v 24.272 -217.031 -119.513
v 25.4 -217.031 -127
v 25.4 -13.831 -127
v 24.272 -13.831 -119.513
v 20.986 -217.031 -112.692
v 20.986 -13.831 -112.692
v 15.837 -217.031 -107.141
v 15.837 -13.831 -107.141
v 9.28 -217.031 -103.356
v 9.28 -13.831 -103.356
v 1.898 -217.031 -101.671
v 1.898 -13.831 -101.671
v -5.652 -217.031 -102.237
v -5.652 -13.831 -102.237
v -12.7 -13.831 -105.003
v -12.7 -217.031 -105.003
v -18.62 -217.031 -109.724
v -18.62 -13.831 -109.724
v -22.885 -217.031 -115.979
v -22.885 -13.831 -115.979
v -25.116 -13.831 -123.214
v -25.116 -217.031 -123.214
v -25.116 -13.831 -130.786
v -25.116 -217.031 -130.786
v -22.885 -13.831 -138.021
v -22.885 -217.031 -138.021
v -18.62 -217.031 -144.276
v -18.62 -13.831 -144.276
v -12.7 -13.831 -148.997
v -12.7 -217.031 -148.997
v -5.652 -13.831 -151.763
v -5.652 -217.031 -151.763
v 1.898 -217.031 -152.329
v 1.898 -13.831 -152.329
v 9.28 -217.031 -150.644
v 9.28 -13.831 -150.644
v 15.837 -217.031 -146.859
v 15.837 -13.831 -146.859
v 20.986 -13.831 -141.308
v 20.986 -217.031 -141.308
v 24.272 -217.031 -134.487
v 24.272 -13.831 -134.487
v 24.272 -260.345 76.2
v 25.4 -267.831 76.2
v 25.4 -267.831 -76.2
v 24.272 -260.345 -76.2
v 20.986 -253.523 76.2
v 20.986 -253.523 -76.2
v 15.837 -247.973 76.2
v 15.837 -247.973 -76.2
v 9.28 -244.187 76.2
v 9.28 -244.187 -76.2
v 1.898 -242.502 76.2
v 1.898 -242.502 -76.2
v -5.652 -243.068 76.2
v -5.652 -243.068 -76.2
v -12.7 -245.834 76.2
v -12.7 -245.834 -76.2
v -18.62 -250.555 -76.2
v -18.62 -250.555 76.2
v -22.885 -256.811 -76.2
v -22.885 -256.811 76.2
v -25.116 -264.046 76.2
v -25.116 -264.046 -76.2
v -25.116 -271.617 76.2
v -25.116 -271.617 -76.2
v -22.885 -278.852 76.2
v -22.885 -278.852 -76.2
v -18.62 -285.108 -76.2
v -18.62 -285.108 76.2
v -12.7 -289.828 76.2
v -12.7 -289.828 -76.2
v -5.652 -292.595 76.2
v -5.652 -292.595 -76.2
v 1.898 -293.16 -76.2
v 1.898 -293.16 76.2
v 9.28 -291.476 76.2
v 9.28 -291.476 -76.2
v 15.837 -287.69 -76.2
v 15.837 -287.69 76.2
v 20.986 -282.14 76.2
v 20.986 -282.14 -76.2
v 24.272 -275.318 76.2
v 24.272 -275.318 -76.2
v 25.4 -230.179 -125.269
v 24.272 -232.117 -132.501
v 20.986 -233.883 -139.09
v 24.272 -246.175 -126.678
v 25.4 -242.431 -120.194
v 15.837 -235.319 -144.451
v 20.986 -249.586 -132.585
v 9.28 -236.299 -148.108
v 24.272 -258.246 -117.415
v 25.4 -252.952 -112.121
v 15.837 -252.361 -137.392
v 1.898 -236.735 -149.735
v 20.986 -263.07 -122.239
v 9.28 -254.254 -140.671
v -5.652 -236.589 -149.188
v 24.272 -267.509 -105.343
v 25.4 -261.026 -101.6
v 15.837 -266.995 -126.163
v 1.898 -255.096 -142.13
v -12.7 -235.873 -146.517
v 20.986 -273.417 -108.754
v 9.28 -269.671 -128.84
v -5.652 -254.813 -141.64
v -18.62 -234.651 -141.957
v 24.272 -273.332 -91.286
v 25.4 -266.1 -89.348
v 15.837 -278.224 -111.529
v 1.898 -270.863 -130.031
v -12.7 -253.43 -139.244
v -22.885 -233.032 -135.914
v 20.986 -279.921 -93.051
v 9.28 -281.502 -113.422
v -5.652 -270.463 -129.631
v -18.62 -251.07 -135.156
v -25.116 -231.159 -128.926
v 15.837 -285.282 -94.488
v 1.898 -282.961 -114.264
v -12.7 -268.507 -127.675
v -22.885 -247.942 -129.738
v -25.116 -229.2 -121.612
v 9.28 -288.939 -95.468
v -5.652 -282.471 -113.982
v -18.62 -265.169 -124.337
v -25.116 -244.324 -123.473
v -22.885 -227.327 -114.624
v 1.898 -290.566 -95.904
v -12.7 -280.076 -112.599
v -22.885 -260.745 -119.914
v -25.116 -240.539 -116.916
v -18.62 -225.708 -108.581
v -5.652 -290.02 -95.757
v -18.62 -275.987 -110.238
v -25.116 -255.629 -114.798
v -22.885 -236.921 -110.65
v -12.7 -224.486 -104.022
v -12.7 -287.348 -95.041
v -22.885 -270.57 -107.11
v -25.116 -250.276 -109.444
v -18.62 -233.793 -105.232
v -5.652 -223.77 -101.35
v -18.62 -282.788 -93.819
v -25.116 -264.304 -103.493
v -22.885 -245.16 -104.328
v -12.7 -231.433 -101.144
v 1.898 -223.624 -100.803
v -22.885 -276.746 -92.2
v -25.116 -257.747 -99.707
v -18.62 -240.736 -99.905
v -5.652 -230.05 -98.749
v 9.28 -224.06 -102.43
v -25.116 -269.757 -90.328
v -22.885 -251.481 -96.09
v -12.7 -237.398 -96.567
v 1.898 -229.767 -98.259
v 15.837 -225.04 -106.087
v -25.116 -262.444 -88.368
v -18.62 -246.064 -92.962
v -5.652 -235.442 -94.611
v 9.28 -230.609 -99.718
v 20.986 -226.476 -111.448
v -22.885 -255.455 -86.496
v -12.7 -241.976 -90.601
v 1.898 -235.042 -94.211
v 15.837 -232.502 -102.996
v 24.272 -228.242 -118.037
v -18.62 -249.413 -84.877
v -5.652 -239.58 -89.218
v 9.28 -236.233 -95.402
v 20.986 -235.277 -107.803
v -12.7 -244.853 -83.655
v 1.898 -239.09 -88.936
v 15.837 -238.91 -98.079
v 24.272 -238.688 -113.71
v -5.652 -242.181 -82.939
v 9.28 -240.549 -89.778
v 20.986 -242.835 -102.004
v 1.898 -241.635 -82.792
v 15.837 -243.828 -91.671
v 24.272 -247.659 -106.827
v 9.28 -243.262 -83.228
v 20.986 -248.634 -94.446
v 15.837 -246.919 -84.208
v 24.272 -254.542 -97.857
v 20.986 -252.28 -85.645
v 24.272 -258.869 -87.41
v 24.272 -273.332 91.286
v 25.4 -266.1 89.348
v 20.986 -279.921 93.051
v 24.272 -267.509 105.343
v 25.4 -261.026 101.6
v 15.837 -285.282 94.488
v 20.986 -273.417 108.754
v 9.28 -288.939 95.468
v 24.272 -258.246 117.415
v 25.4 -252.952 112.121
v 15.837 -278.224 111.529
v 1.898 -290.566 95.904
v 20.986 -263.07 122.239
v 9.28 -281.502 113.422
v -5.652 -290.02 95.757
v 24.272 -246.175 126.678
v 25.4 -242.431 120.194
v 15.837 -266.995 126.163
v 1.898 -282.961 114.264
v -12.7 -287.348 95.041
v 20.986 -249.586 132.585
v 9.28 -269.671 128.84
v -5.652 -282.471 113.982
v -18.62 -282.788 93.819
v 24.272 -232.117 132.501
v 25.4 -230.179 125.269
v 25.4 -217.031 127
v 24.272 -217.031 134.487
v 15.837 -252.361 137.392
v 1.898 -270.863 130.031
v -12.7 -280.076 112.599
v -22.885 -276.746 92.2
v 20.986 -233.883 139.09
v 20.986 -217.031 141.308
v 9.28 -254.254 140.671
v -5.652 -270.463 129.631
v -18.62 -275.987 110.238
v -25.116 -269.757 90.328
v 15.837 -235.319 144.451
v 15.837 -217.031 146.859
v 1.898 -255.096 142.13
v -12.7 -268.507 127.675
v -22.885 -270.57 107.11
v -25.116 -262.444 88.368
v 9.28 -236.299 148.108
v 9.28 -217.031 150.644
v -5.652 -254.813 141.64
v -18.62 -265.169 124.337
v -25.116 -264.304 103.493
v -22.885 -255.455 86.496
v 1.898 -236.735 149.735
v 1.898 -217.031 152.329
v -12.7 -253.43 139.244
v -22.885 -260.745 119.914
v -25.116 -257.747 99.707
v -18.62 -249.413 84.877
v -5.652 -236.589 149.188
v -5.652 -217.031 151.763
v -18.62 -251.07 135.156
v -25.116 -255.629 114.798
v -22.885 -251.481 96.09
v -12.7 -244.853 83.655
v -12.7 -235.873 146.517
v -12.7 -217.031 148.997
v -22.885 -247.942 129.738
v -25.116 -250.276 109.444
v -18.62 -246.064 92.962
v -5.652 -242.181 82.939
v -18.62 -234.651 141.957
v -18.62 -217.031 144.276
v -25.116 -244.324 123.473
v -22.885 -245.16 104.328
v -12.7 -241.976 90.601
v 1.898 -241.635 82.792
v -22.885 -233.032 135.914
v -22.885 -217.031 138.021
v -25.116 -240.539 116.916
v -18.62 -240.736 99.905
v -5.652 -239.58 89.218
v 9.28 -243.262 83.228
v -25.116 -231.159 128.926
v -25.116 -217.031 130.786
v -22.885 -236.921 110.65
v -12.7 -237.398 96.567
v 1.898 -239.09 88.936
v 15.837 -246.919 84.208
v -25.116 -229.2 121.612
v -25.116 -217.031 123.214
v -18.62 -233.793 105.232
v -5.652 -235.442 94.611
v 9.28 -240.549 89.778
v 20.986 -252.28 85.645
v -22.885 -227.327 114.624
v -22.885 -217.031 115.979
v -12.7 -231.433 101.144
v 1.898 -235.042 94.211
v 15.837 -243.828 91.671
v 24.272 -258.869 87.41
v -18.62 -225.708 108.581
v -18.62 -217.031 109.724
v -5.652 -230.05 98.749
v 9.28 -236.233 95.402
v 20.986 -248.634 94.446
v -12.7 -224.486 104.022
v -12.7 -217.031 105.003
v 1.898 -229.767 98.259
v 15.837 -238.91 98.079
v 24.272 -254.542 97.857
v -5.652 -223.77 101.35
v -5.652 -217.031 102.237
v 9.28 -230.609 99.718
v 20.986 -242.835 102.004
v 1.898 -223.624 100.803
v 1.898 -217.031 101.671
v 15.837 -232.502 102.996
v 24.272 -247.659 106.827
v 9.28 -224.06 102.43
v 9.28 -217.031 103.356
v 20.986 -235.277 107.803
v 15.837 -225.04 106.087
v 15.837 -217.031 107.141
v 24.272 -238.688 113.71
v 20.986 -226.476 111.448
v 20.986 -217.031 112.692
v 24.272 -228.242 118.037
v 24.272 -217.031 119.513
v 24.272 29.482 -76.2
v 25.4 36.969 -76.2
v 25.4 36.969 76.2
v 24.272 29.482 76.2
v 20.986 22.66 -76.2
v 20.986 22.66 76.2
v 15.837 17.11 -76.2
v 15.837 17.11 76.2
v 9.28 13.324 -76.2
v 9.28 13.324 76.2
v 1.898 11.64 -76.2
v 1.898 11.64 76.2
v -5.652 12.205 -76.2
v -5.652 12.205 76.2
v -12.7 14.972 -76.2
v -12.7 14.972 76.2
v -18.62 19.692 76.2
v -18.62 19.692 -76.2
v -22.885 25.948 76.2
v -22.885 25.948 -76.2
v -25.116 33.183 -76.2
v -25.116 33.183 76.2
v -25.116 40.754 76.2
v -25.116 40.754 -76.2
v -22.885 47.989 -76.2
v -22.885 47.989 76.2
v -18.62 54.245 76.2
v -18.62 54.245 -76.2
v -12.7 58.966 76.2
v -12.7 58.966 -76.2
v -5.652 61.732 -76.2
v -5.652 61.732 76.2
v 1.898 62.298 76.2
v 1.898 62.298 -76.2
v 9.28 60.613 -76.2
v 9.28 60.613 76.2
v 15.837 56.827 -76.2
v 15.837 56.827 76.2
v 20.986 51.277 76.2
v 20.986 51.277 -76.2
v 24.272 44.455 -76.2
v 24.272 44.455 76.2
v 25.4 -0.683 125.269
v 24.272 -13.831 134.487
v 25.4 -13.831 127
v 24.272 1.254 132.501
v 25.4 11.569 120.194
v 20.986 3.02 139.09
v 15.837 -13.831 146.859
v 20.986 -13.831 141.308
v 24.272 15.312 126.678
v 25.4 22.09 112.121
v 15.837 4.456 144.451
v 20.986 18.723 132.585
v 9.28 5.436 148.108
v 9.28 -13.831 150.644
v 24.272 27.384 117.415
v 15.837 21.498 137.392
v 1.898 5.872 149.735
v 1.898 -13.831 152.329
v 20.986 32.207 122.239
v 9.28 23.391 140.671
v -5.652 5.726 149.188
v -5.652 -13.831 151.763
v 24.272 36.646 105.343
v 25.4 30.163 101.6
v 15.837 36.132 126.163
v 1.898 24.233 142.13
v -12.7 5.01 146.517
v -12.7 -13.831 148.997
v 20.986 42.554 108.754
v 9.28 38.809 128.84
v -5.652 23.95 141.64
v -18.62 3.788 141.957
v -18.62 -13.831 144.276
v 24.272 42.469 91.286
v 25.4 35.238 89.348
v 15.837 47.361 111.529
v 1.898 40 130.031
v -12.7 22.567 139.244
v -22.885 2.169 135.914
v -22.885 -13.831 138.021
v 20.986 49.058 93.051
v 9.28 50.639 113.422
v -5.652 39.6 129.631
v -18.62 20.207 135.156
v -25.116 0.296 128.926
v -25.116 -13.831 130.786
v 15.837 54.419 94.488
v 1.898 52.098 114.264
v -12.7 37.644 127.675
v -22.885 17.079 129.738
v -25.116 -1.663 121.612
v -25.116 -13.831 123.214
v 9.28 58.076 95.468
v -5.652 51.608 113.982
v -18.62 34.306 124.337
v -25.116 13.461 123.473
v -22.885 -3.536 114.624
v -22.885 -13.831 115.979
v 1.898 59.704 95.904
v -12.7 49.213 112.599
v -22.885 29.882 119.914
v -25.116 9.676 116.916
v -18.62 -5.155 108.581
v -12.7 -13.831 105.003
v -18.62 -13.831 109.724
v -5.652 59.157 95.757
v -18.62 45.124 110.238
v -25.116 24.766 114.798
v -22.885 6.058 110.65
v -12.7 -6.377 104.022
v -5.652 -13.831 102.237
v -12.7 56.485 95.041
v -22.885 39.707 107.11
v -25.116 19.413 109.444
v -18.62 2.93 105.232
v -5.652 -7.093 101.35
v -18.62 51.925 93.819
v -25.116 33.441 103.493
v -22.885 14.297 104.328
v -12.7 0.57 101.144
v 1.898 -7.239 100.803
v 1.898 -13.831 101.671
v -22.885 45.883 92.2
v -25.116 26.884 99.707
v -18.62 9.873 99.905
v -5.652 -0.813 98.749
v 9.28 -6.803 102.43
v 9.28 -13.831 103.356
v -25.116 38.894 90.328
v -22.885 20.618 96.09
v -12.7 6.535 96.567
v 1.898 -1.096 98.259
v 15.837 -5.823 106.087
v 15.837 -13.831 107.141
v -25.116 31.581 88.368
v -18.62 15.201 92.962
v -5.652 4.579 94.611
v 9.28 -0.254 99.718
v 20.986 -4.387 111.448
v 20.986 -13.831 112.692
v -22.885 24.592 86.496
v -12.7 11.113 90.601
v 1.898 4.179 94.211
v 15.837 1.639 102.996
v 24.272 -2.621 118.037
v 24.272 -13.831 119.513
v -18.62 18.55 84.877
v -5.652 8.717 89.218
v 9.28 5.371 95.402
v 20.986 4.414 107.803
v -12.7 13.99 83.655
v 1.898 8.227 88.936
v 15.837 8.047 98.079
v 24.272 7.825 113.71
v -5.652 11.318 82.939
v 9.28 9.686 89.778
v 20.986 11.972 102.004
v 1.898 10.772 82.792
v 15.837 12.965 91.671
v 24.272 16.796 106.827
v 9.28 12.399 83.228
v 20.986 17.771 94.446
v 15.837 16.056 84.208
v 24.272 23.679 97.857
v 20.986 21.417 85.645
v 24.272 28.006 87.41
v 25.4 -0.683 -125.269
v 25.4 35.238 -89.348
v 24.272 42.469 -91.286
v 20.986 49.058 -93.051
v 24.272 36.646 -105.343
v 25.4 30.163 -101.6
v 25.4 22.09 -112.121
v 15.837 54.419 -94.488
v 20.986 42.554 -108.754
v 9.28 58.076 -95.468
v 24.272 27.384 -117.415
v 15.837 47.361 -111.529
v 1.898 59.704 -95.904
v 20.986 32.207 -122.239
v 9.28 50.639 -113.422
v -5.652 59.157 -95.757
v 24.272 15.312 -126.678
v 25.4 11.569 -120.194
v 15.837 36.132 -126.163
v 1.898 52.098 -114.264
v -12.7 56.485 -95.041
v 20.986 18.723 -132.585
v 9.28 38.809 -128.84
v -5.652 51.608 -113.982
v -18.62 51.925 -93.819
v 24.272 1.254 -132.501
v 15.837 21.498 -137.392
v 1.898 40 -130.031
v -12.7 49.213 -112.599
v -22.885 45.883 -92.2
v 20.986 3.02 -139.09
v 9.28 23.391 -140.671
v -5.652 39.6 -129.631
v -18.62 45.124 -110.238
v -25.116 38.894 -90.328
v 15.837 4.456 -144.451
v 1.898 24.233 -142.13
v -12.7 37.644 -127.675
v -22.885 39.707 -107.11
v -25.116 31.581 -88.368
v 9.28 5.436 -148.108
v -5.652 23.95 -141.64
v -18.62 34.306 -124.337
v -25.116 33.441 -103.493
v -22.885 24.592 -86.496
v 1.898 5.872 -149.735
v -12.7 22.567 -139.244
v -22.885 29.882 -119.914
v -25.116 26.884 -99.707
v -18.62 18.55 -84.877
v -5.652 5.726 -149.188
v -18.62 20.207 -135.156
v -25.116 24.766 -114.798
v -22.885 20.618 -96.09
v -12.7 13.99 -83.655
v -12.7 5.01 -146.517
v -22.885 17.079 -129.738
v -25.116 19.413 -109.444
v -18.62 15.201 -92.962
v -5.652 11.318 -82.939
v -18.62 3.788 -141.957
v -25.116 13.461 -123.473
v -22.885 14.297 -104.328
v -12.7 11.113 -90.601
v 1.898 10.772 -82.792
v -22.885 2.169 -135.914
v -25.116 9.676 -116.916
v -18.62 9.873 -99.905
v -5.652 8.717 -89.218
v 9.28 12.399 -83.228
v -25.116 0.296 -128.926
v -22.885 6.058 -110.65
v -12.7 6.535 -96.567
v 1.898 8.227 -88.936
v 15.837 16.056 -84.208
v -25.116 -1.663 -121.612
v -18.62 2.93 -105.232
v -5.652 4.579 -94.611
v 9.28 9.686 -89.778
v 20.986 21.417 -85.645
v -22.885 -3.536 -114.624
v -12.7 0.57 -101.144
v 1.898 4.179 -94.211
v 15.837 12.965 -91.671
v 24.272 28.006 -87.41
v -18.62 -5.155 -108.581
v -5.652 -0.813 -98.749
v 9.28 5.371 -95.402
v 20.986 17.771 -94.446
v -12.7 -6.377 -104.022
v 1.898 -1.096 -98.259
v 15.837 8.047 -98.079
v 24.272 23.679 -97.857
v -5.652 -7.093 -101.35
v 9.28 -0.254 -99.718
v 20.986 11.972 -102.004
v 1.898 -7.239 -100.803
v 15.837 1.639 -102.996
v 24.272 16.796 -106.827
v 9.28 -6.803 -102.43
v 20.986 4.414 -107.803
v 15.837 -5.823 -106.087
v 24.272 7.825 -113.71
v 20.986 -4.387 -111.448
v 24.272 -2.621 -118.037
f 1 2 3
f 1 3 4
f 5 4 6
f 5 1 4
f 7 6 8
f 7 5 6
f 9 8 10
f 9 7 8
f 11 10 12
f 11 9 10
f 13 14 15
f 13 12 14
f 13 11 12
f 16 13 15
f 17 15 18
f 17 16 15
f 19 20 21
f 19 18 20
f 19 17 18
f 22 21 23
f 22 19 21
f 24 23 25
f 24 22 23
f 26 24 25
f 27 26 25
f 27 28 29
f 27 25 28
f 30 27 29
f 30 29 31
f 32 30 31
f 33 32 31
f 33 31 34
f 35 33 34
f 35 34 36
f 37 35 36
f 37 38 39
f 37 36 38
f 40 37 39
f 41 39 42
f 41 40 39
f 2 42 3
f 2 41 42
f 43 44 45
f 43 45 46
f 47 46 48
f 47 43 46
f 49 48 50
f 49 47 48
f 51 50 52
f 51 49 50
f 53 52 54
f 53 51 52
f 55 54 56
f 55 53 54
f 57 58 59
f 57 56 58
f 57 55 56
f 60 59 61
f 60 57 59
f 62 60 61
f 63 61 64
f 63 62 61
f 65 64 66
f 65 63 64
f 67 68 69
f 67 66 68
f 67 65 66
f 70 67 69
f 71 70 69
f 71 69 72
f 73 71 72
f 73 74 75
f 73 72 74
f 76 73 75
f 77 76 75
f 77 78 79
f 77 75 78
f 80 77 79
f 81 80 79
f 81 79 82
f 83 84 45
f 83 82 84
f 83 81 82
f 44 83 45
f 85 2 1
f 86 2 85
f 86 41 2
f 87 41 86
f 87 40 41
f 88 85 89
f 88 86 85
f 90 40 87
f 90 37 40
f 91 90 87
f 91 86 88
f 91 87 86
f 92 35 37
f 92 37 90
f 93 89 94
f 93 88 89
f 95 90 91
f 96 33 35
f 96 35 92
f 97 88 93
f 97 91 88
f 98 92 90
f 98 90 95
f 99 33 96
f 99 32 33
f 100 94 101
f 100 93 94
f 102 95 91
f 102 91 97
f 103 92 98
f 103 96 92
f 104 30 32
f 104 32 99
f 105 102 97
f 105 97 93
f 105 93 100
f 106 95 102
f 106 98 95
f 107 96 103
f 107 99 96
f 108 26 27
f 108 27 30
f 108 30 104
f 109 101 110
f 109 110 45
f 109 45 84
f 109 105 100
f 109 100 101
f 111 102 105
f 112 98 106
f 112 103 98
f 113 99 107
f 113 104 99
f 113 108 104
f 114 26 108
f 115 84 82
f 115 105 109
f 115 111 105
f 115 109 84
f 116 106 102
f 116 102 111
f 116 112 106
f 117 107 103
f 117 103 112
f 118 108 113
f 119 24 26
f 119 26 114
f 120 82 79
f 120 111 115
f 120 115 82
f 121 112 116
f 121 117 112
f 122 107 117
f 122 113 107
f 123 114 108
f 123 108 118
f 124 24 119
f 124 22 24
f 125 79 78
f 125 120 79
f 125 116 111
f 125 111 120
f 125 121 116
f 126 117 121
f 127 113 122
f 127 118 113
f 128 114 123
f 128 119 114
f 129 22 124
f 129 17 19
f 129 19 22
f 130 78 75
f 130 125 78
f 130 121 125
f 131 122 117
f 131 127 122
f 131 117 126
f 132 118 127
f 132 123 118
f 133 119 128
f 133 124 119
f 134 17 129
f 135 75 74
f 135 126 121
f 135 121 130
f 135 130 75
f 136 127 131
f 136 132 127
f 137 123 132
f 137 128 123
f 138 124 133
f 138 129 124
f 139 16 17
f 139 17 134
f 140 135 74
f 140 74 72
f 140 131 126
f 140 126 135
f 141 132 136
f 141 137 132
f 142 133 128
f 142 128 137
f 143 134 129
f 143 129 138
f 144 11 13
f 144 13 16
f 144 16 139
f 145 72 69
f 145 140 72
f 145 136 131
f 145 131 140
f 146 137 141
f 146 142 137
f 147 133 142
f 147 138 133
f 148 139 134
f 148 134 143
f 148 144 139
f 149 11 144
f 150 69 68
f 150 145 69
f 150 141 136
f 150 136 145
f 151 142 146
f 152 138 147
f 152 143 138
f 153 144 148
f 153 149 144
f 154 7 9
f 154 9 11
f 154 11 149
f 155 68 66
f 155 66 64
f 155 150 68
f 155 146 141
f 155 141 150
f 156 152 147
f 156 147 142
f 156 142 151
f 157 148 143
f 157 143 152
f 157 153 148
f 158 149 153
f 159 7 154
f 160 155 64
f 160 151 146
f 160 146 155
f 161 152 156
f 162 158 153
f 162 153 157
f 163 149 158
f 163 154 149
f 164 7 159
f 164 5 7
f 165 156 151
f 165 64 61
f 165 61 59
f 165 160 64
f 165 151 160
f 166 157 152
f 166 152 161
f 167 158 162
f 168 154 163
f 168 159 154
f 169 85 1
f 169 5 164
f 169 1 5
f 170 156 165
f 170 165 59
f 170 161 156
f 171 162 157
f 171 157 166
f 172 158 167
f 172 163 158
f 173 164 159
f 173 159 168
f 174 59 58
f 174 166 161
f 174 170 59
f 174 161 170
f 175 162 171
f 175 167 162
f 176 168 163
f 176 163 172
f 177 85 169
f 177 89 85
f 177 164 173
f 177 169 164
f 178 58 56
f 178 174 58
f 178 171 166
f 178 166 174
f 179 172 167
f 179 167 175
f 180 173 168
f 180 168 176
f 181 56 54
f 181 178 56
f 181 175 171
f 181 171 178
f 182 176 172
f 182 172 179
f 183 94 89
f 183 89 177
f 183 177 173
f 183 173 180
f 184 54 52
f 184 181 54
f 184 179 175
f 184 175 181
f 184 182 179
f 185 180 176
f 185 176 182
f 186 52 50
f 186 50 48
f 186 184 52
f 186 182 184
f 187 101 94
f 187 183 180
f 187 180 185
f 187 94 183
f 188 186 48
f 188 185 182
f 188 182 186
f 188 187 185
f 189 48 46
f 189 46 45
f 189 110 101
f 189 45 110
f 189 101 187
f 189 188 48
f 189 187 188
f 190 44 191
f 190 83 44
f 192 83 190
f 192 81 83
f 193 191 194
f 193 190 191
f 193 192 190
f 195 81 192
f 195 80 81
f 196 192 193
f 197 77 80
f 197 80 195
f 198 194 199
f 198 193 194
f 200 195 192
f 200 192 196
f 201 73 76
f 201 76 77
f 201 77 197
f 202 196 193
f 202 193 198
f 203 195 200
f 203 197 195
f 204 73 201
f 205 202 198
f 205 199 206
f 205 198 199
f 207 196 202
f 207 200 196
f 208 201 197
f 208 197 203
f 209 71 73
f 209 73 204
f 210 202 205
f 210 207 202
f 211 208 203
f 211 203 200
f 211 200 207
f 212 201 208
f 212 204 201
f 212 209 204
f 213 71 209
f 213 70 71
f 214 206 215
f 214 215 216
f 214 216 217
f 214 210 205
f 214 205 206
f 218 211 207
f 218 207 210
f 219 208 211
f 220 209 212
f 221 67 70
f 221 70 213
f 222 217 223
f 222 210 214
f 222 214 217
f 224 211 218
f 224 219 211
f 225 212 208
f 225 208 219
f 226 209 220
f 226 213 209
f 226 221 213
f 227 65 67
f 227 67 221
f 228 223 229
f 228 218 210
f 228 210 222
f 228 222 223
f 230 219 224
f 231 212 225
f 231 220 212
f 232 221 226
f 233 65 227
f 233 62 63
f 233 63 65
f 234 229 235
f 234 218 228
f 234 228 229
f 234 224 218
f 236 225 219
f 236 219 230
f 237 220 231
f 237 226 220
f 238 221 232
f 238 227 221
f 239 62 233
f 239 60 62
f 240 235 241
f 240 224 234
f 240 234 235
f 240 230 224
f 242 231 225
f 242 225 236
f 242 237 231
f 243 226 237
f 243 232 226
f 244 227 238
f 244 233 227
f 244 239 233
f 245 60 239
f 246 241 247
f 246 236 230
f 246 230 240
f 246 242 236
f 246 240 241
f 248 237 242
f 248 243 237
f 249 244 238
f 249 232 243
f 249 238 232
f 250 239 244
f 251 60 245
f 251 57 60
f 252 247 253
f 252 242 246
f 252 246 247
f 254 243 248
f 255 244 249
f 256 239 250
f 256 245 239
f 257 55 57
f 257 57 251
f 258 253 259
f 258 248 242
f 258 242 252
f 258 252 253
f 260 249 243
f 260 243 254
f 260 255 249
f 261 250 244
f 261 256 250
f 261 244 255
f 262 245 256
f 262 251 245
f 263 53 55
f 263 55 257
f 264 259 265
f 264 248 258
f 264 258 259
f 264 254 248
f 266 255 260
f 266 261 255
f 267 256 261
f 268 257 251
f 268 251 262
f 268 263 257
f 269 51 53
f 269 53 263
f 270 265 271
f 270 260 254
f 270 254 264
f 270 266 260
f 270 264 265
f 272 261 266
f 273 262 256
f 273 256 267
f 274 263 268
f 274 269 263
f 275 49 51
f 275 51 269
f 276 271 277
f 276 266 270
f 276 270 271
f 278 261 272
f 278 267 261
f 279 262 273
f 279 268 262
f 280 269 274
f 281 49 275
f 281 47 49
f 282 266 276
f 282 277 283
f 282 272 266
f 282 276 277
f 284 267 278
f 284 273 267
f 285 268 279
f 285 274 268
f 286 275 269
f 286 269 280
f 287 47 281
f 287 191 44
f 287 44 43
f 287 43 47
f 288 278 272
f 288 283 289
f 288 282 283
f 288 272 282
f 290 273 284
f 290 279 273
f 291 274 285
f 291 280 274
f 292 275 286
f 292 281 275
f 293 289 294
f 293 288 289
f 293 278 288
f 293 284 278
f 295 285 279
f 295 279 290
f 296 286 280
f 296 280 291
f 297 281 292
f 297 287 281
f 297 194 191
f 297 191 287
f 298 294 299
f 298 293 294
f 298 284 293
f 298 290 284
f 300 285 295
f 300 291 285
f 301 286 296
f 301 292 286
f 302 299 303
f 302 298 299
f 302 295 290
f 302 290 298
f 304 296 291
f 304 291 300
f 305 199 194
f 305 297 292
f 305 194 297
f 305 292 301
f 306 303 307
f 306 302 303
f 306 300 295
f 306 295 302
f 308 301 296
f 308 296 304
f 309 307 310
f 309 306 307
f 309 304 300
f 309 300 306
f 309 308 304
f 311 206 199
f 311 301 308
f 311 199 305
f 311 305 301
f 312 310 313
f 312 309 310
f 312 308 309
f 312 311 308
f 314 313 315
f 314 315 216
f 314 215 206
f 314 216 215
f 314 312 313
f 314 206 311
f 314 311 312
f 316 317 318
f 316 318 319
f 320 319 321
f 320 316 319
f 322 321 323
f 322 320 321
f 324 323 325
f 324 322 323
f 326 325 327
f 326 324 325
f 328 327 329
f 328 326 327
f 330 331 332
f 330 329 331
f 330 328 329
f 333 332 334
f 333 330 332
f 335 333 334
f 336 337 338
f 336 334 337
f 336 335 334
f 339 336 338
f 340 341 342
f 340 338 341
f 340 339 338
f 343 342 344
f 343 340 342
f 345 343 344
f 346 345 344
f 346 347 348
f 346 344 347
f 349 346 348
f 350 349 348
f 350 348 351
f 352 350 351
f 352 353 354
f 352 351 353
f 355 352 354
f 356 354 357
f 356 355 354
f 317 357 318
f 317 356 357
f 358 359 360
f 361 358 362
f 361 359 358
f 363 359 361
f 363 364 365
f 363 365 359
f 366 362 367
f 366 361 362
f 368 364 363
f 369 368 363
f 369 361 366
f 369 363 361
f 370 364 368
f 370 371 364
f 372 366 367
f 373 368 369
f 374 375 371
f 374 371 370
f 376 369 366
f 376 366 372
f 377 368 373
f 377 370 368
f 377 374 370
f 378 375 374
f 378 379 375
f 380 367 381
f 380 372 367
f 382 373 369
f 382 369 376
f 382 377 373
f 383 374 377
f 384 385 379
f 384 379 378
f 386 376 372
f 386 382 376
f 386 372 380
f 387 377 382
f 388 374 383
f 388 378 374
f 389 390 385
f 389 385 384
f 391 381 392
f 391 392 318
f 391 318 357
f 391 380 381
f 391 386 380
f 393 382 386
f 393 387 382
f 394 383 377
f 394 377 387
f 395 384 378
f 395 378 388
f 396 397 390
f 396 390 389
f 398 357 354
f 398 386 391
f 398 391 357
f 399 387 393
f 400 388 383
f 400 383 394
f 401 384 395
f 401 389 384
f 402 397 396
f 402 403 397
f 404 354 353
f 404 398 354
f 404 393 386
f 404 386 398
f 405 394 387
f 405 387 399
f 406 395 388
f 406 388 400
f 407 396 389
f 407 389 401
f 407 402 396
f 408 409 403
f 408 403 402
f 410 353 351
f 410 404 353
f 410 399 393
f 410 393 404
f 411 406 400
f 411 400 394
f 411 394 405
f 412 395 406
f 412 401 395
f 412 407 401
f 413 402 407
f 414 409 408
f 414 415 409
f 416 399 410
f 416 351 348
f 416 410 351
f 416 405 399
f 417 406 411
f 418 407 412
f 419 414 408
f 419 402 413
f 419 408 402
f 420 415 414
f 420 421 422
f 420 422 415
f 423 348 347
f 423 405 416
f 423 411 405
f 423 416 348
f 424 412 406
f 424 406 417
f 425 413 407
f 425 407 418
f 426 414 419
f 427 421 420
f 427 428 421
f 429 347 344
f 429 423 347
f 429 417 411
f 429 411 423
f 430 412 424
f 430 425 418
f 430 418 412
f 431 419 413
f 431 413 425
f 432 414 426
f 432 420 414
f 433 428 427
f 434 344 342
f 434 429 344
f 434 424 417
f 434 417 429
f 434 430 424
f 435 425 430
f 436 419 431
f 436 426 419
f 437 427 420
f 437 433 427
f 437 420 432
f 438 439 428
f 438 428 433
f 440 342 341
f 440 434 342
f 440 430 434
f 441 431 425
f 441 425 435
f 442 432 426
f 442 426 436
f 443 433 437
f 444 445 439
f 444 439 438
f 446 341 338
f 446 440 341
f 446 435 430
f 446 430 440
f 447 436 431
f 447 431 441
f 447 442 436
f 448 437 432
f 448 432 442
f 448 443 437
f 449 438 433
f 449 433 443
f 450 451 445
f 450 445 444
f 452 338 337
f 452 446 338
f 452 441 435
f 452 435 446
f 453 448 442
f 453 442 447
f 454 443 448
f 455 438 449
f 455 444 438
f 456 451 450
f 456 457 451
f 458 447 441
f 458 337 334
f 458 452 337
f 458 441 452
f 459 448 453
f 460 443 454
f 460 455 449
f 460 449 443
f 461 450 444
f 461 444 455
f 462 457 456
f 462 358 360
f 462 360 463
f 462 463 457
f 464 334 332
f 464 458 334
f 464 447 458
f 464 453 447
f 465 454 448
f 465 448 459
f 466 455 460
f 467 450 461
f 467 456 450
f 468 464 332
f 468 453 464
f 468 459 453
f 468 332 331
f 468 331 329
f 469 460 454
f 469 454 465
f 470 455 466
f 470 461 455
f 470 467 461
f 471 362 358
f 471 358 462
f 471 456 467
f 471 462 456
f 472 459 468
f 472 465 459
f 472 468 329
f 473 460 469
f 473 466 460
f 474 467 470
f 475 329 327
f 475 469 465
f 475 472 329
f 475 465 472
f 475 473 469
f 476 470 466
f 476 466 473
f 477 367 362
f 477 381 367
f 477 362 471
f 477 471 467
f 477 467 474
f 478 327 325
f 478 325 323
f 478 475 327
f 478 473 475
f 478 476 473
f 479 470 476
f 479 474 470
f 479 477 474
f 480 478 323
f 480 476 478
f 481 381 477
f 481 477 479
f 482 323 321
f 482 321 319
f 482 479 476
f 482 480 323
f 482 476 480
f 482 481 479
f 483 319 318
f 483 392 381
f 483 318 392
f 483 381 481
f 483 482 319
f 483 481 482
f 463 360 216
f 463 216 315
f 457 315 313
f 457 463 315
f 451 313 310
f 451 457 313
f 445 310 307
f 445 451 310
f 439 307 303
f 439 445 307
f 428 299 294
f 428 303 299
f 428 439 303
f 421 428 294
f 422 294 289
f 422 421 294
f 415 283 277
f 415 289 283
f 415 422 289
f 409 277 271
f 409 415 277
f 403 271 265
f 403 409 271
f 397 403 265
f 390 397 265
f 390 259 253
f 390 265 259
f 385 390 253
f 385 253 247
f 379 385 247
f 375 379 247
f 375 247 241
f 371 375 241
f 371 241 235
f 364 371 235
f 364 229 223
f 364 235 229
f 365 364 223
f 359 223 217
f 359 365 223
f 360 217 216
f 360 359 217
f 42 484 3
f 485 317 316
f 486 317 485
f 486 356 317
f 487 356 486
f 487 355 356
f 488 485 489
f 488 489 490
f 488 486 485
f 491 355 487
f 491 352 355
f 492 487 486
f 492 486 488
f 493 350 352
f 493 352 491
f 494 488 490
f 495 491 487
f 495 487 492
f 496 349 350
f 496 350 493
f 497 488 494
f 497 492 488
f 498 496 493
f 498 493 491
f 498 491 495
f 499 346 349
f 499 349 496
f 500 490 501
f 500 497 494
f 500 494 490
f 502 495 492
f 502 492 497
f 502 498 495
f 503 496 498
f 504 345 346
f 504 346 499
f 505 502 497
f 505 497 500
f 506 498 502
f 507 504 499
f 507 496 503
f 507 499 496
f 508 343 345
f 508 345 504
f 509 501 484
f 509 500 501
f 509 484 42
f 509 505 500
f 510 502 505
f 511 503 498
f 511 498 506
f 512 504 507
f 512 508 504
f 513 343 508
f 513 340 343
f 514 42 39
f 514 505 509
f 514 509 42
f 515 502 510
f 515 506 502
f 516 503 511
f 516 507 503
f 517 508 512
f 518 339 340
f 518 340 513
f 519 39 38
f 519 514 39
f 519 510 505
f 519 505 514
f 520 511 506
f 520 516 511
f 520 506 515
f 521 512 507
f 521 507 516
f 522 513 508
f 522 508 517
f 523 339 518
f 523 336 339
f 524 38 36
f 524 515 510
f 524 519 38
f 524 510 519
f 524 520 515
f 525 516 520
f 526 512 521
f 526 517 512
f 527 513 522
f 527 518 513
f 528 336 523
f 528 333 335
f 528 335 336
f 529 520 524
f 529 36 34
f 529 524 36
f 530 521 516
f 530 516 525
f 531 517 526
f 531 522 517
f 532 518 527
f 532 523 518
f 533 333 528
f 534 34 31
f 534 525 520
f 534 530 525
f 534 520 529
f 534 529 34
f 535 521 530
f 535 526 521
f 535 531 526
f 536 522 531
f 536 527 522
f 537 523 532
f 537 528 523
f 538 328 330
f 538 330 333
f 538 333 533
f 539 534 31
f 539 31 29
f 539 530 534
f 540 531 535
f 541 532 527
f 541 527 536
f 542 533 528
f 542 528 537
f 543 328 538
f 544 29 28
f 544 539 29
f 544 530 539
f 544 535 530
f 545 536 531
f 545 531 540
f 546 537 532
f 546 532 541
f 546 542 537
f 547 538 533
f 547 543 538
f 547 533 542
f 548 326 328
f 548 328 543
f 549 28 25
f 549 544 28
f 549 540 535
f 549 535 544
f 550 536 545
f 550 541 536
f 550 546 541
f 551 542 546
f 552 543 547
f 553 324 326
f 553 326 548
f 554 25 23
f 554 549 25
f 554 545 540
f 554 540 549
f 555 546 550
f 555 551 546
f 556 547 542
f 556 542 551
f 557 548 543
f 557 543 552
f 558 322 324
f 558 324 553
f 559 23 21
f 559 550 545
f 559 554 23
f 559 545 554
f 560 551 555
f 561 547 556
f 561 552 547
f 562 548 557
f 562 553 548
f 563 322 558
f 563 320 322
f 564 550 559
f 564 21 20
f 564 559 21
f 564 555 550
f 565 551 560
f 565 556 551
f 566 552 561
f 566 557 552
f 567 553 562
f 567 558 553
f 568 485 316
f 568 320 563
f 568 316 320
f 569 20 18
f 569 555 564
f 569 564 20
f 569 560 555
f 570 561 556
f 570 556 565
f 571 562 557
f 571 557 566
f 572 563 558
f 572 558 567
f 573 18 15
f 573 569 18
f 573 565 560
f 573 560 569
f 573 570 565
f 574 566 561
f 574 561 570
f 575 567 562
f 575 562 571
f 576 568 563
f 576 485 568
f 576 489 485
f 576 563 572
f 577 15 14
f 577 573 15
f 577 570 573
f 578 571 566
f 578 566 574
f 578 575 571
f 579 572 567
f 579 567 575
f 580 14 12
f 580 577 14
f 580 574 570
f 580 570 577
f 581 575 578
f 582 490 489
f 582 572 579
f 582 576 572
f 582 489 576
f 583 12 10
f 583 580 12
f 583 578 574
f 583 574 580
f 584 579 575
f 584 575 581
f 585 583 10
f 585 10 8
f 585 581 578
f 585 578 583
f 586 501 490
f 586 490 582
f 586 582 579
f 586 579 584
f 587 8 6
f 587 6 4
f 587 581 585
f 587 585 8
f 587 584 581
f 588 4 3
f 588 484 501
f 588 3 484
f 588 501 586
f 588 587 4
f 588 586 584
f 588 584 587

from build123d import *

# Parameters (mm, degrees)
SKETCH1_R = 25.4


with BuildPart() as part:
    # Sweep1: sweep along a curve in space
    with BuildLine() as sweep1_path:
        Line((0, 36.968559092, 0), (0, 36.968559092, -76.2))
        ThreePointArc((0, 36.968559092, -76.2), (0, 22.089583576, -112.121024484), (0, -13.831440908, -127))
        Line((0, -13.831440908, -127), (0, -217.031440908, -127))
        ThreePointArc((0, -217.031440908, -127), (0, -252.952465392, -112.121024484), (0, -267.831440908, -76.2))
        Line((0, -267.831440908, -76.2), (0, -267.831440908, -1.63913495))
        Line((0, -267.831440908, -1.63913495), (0, -267.831440908, 76.2))
        ThreePointArc((0, -267.831440908, 76.2), (0, -252.952465392, 112.121024484), (0, -217.031440908, 127))
        Line((0, -217.031440908, 127), (0, -13.831440908, 127))
        ThreePointArc((0, 36.968559092, 76.2), (0, 22.089583576, 112.121024484), (0, -13.831440908, 127))
        Line((0, 36.968559092, 0), (0, 36.968559092, 76.2))
    # Sketch1 → Sweep1 (sweep)
    with BuildSketch(Plane.XY):
        with Locations((0, 36.968559092)):
            Circle(SKETCH1_R)
    sweep(path=sweep1_path.line)


solid = part.part
